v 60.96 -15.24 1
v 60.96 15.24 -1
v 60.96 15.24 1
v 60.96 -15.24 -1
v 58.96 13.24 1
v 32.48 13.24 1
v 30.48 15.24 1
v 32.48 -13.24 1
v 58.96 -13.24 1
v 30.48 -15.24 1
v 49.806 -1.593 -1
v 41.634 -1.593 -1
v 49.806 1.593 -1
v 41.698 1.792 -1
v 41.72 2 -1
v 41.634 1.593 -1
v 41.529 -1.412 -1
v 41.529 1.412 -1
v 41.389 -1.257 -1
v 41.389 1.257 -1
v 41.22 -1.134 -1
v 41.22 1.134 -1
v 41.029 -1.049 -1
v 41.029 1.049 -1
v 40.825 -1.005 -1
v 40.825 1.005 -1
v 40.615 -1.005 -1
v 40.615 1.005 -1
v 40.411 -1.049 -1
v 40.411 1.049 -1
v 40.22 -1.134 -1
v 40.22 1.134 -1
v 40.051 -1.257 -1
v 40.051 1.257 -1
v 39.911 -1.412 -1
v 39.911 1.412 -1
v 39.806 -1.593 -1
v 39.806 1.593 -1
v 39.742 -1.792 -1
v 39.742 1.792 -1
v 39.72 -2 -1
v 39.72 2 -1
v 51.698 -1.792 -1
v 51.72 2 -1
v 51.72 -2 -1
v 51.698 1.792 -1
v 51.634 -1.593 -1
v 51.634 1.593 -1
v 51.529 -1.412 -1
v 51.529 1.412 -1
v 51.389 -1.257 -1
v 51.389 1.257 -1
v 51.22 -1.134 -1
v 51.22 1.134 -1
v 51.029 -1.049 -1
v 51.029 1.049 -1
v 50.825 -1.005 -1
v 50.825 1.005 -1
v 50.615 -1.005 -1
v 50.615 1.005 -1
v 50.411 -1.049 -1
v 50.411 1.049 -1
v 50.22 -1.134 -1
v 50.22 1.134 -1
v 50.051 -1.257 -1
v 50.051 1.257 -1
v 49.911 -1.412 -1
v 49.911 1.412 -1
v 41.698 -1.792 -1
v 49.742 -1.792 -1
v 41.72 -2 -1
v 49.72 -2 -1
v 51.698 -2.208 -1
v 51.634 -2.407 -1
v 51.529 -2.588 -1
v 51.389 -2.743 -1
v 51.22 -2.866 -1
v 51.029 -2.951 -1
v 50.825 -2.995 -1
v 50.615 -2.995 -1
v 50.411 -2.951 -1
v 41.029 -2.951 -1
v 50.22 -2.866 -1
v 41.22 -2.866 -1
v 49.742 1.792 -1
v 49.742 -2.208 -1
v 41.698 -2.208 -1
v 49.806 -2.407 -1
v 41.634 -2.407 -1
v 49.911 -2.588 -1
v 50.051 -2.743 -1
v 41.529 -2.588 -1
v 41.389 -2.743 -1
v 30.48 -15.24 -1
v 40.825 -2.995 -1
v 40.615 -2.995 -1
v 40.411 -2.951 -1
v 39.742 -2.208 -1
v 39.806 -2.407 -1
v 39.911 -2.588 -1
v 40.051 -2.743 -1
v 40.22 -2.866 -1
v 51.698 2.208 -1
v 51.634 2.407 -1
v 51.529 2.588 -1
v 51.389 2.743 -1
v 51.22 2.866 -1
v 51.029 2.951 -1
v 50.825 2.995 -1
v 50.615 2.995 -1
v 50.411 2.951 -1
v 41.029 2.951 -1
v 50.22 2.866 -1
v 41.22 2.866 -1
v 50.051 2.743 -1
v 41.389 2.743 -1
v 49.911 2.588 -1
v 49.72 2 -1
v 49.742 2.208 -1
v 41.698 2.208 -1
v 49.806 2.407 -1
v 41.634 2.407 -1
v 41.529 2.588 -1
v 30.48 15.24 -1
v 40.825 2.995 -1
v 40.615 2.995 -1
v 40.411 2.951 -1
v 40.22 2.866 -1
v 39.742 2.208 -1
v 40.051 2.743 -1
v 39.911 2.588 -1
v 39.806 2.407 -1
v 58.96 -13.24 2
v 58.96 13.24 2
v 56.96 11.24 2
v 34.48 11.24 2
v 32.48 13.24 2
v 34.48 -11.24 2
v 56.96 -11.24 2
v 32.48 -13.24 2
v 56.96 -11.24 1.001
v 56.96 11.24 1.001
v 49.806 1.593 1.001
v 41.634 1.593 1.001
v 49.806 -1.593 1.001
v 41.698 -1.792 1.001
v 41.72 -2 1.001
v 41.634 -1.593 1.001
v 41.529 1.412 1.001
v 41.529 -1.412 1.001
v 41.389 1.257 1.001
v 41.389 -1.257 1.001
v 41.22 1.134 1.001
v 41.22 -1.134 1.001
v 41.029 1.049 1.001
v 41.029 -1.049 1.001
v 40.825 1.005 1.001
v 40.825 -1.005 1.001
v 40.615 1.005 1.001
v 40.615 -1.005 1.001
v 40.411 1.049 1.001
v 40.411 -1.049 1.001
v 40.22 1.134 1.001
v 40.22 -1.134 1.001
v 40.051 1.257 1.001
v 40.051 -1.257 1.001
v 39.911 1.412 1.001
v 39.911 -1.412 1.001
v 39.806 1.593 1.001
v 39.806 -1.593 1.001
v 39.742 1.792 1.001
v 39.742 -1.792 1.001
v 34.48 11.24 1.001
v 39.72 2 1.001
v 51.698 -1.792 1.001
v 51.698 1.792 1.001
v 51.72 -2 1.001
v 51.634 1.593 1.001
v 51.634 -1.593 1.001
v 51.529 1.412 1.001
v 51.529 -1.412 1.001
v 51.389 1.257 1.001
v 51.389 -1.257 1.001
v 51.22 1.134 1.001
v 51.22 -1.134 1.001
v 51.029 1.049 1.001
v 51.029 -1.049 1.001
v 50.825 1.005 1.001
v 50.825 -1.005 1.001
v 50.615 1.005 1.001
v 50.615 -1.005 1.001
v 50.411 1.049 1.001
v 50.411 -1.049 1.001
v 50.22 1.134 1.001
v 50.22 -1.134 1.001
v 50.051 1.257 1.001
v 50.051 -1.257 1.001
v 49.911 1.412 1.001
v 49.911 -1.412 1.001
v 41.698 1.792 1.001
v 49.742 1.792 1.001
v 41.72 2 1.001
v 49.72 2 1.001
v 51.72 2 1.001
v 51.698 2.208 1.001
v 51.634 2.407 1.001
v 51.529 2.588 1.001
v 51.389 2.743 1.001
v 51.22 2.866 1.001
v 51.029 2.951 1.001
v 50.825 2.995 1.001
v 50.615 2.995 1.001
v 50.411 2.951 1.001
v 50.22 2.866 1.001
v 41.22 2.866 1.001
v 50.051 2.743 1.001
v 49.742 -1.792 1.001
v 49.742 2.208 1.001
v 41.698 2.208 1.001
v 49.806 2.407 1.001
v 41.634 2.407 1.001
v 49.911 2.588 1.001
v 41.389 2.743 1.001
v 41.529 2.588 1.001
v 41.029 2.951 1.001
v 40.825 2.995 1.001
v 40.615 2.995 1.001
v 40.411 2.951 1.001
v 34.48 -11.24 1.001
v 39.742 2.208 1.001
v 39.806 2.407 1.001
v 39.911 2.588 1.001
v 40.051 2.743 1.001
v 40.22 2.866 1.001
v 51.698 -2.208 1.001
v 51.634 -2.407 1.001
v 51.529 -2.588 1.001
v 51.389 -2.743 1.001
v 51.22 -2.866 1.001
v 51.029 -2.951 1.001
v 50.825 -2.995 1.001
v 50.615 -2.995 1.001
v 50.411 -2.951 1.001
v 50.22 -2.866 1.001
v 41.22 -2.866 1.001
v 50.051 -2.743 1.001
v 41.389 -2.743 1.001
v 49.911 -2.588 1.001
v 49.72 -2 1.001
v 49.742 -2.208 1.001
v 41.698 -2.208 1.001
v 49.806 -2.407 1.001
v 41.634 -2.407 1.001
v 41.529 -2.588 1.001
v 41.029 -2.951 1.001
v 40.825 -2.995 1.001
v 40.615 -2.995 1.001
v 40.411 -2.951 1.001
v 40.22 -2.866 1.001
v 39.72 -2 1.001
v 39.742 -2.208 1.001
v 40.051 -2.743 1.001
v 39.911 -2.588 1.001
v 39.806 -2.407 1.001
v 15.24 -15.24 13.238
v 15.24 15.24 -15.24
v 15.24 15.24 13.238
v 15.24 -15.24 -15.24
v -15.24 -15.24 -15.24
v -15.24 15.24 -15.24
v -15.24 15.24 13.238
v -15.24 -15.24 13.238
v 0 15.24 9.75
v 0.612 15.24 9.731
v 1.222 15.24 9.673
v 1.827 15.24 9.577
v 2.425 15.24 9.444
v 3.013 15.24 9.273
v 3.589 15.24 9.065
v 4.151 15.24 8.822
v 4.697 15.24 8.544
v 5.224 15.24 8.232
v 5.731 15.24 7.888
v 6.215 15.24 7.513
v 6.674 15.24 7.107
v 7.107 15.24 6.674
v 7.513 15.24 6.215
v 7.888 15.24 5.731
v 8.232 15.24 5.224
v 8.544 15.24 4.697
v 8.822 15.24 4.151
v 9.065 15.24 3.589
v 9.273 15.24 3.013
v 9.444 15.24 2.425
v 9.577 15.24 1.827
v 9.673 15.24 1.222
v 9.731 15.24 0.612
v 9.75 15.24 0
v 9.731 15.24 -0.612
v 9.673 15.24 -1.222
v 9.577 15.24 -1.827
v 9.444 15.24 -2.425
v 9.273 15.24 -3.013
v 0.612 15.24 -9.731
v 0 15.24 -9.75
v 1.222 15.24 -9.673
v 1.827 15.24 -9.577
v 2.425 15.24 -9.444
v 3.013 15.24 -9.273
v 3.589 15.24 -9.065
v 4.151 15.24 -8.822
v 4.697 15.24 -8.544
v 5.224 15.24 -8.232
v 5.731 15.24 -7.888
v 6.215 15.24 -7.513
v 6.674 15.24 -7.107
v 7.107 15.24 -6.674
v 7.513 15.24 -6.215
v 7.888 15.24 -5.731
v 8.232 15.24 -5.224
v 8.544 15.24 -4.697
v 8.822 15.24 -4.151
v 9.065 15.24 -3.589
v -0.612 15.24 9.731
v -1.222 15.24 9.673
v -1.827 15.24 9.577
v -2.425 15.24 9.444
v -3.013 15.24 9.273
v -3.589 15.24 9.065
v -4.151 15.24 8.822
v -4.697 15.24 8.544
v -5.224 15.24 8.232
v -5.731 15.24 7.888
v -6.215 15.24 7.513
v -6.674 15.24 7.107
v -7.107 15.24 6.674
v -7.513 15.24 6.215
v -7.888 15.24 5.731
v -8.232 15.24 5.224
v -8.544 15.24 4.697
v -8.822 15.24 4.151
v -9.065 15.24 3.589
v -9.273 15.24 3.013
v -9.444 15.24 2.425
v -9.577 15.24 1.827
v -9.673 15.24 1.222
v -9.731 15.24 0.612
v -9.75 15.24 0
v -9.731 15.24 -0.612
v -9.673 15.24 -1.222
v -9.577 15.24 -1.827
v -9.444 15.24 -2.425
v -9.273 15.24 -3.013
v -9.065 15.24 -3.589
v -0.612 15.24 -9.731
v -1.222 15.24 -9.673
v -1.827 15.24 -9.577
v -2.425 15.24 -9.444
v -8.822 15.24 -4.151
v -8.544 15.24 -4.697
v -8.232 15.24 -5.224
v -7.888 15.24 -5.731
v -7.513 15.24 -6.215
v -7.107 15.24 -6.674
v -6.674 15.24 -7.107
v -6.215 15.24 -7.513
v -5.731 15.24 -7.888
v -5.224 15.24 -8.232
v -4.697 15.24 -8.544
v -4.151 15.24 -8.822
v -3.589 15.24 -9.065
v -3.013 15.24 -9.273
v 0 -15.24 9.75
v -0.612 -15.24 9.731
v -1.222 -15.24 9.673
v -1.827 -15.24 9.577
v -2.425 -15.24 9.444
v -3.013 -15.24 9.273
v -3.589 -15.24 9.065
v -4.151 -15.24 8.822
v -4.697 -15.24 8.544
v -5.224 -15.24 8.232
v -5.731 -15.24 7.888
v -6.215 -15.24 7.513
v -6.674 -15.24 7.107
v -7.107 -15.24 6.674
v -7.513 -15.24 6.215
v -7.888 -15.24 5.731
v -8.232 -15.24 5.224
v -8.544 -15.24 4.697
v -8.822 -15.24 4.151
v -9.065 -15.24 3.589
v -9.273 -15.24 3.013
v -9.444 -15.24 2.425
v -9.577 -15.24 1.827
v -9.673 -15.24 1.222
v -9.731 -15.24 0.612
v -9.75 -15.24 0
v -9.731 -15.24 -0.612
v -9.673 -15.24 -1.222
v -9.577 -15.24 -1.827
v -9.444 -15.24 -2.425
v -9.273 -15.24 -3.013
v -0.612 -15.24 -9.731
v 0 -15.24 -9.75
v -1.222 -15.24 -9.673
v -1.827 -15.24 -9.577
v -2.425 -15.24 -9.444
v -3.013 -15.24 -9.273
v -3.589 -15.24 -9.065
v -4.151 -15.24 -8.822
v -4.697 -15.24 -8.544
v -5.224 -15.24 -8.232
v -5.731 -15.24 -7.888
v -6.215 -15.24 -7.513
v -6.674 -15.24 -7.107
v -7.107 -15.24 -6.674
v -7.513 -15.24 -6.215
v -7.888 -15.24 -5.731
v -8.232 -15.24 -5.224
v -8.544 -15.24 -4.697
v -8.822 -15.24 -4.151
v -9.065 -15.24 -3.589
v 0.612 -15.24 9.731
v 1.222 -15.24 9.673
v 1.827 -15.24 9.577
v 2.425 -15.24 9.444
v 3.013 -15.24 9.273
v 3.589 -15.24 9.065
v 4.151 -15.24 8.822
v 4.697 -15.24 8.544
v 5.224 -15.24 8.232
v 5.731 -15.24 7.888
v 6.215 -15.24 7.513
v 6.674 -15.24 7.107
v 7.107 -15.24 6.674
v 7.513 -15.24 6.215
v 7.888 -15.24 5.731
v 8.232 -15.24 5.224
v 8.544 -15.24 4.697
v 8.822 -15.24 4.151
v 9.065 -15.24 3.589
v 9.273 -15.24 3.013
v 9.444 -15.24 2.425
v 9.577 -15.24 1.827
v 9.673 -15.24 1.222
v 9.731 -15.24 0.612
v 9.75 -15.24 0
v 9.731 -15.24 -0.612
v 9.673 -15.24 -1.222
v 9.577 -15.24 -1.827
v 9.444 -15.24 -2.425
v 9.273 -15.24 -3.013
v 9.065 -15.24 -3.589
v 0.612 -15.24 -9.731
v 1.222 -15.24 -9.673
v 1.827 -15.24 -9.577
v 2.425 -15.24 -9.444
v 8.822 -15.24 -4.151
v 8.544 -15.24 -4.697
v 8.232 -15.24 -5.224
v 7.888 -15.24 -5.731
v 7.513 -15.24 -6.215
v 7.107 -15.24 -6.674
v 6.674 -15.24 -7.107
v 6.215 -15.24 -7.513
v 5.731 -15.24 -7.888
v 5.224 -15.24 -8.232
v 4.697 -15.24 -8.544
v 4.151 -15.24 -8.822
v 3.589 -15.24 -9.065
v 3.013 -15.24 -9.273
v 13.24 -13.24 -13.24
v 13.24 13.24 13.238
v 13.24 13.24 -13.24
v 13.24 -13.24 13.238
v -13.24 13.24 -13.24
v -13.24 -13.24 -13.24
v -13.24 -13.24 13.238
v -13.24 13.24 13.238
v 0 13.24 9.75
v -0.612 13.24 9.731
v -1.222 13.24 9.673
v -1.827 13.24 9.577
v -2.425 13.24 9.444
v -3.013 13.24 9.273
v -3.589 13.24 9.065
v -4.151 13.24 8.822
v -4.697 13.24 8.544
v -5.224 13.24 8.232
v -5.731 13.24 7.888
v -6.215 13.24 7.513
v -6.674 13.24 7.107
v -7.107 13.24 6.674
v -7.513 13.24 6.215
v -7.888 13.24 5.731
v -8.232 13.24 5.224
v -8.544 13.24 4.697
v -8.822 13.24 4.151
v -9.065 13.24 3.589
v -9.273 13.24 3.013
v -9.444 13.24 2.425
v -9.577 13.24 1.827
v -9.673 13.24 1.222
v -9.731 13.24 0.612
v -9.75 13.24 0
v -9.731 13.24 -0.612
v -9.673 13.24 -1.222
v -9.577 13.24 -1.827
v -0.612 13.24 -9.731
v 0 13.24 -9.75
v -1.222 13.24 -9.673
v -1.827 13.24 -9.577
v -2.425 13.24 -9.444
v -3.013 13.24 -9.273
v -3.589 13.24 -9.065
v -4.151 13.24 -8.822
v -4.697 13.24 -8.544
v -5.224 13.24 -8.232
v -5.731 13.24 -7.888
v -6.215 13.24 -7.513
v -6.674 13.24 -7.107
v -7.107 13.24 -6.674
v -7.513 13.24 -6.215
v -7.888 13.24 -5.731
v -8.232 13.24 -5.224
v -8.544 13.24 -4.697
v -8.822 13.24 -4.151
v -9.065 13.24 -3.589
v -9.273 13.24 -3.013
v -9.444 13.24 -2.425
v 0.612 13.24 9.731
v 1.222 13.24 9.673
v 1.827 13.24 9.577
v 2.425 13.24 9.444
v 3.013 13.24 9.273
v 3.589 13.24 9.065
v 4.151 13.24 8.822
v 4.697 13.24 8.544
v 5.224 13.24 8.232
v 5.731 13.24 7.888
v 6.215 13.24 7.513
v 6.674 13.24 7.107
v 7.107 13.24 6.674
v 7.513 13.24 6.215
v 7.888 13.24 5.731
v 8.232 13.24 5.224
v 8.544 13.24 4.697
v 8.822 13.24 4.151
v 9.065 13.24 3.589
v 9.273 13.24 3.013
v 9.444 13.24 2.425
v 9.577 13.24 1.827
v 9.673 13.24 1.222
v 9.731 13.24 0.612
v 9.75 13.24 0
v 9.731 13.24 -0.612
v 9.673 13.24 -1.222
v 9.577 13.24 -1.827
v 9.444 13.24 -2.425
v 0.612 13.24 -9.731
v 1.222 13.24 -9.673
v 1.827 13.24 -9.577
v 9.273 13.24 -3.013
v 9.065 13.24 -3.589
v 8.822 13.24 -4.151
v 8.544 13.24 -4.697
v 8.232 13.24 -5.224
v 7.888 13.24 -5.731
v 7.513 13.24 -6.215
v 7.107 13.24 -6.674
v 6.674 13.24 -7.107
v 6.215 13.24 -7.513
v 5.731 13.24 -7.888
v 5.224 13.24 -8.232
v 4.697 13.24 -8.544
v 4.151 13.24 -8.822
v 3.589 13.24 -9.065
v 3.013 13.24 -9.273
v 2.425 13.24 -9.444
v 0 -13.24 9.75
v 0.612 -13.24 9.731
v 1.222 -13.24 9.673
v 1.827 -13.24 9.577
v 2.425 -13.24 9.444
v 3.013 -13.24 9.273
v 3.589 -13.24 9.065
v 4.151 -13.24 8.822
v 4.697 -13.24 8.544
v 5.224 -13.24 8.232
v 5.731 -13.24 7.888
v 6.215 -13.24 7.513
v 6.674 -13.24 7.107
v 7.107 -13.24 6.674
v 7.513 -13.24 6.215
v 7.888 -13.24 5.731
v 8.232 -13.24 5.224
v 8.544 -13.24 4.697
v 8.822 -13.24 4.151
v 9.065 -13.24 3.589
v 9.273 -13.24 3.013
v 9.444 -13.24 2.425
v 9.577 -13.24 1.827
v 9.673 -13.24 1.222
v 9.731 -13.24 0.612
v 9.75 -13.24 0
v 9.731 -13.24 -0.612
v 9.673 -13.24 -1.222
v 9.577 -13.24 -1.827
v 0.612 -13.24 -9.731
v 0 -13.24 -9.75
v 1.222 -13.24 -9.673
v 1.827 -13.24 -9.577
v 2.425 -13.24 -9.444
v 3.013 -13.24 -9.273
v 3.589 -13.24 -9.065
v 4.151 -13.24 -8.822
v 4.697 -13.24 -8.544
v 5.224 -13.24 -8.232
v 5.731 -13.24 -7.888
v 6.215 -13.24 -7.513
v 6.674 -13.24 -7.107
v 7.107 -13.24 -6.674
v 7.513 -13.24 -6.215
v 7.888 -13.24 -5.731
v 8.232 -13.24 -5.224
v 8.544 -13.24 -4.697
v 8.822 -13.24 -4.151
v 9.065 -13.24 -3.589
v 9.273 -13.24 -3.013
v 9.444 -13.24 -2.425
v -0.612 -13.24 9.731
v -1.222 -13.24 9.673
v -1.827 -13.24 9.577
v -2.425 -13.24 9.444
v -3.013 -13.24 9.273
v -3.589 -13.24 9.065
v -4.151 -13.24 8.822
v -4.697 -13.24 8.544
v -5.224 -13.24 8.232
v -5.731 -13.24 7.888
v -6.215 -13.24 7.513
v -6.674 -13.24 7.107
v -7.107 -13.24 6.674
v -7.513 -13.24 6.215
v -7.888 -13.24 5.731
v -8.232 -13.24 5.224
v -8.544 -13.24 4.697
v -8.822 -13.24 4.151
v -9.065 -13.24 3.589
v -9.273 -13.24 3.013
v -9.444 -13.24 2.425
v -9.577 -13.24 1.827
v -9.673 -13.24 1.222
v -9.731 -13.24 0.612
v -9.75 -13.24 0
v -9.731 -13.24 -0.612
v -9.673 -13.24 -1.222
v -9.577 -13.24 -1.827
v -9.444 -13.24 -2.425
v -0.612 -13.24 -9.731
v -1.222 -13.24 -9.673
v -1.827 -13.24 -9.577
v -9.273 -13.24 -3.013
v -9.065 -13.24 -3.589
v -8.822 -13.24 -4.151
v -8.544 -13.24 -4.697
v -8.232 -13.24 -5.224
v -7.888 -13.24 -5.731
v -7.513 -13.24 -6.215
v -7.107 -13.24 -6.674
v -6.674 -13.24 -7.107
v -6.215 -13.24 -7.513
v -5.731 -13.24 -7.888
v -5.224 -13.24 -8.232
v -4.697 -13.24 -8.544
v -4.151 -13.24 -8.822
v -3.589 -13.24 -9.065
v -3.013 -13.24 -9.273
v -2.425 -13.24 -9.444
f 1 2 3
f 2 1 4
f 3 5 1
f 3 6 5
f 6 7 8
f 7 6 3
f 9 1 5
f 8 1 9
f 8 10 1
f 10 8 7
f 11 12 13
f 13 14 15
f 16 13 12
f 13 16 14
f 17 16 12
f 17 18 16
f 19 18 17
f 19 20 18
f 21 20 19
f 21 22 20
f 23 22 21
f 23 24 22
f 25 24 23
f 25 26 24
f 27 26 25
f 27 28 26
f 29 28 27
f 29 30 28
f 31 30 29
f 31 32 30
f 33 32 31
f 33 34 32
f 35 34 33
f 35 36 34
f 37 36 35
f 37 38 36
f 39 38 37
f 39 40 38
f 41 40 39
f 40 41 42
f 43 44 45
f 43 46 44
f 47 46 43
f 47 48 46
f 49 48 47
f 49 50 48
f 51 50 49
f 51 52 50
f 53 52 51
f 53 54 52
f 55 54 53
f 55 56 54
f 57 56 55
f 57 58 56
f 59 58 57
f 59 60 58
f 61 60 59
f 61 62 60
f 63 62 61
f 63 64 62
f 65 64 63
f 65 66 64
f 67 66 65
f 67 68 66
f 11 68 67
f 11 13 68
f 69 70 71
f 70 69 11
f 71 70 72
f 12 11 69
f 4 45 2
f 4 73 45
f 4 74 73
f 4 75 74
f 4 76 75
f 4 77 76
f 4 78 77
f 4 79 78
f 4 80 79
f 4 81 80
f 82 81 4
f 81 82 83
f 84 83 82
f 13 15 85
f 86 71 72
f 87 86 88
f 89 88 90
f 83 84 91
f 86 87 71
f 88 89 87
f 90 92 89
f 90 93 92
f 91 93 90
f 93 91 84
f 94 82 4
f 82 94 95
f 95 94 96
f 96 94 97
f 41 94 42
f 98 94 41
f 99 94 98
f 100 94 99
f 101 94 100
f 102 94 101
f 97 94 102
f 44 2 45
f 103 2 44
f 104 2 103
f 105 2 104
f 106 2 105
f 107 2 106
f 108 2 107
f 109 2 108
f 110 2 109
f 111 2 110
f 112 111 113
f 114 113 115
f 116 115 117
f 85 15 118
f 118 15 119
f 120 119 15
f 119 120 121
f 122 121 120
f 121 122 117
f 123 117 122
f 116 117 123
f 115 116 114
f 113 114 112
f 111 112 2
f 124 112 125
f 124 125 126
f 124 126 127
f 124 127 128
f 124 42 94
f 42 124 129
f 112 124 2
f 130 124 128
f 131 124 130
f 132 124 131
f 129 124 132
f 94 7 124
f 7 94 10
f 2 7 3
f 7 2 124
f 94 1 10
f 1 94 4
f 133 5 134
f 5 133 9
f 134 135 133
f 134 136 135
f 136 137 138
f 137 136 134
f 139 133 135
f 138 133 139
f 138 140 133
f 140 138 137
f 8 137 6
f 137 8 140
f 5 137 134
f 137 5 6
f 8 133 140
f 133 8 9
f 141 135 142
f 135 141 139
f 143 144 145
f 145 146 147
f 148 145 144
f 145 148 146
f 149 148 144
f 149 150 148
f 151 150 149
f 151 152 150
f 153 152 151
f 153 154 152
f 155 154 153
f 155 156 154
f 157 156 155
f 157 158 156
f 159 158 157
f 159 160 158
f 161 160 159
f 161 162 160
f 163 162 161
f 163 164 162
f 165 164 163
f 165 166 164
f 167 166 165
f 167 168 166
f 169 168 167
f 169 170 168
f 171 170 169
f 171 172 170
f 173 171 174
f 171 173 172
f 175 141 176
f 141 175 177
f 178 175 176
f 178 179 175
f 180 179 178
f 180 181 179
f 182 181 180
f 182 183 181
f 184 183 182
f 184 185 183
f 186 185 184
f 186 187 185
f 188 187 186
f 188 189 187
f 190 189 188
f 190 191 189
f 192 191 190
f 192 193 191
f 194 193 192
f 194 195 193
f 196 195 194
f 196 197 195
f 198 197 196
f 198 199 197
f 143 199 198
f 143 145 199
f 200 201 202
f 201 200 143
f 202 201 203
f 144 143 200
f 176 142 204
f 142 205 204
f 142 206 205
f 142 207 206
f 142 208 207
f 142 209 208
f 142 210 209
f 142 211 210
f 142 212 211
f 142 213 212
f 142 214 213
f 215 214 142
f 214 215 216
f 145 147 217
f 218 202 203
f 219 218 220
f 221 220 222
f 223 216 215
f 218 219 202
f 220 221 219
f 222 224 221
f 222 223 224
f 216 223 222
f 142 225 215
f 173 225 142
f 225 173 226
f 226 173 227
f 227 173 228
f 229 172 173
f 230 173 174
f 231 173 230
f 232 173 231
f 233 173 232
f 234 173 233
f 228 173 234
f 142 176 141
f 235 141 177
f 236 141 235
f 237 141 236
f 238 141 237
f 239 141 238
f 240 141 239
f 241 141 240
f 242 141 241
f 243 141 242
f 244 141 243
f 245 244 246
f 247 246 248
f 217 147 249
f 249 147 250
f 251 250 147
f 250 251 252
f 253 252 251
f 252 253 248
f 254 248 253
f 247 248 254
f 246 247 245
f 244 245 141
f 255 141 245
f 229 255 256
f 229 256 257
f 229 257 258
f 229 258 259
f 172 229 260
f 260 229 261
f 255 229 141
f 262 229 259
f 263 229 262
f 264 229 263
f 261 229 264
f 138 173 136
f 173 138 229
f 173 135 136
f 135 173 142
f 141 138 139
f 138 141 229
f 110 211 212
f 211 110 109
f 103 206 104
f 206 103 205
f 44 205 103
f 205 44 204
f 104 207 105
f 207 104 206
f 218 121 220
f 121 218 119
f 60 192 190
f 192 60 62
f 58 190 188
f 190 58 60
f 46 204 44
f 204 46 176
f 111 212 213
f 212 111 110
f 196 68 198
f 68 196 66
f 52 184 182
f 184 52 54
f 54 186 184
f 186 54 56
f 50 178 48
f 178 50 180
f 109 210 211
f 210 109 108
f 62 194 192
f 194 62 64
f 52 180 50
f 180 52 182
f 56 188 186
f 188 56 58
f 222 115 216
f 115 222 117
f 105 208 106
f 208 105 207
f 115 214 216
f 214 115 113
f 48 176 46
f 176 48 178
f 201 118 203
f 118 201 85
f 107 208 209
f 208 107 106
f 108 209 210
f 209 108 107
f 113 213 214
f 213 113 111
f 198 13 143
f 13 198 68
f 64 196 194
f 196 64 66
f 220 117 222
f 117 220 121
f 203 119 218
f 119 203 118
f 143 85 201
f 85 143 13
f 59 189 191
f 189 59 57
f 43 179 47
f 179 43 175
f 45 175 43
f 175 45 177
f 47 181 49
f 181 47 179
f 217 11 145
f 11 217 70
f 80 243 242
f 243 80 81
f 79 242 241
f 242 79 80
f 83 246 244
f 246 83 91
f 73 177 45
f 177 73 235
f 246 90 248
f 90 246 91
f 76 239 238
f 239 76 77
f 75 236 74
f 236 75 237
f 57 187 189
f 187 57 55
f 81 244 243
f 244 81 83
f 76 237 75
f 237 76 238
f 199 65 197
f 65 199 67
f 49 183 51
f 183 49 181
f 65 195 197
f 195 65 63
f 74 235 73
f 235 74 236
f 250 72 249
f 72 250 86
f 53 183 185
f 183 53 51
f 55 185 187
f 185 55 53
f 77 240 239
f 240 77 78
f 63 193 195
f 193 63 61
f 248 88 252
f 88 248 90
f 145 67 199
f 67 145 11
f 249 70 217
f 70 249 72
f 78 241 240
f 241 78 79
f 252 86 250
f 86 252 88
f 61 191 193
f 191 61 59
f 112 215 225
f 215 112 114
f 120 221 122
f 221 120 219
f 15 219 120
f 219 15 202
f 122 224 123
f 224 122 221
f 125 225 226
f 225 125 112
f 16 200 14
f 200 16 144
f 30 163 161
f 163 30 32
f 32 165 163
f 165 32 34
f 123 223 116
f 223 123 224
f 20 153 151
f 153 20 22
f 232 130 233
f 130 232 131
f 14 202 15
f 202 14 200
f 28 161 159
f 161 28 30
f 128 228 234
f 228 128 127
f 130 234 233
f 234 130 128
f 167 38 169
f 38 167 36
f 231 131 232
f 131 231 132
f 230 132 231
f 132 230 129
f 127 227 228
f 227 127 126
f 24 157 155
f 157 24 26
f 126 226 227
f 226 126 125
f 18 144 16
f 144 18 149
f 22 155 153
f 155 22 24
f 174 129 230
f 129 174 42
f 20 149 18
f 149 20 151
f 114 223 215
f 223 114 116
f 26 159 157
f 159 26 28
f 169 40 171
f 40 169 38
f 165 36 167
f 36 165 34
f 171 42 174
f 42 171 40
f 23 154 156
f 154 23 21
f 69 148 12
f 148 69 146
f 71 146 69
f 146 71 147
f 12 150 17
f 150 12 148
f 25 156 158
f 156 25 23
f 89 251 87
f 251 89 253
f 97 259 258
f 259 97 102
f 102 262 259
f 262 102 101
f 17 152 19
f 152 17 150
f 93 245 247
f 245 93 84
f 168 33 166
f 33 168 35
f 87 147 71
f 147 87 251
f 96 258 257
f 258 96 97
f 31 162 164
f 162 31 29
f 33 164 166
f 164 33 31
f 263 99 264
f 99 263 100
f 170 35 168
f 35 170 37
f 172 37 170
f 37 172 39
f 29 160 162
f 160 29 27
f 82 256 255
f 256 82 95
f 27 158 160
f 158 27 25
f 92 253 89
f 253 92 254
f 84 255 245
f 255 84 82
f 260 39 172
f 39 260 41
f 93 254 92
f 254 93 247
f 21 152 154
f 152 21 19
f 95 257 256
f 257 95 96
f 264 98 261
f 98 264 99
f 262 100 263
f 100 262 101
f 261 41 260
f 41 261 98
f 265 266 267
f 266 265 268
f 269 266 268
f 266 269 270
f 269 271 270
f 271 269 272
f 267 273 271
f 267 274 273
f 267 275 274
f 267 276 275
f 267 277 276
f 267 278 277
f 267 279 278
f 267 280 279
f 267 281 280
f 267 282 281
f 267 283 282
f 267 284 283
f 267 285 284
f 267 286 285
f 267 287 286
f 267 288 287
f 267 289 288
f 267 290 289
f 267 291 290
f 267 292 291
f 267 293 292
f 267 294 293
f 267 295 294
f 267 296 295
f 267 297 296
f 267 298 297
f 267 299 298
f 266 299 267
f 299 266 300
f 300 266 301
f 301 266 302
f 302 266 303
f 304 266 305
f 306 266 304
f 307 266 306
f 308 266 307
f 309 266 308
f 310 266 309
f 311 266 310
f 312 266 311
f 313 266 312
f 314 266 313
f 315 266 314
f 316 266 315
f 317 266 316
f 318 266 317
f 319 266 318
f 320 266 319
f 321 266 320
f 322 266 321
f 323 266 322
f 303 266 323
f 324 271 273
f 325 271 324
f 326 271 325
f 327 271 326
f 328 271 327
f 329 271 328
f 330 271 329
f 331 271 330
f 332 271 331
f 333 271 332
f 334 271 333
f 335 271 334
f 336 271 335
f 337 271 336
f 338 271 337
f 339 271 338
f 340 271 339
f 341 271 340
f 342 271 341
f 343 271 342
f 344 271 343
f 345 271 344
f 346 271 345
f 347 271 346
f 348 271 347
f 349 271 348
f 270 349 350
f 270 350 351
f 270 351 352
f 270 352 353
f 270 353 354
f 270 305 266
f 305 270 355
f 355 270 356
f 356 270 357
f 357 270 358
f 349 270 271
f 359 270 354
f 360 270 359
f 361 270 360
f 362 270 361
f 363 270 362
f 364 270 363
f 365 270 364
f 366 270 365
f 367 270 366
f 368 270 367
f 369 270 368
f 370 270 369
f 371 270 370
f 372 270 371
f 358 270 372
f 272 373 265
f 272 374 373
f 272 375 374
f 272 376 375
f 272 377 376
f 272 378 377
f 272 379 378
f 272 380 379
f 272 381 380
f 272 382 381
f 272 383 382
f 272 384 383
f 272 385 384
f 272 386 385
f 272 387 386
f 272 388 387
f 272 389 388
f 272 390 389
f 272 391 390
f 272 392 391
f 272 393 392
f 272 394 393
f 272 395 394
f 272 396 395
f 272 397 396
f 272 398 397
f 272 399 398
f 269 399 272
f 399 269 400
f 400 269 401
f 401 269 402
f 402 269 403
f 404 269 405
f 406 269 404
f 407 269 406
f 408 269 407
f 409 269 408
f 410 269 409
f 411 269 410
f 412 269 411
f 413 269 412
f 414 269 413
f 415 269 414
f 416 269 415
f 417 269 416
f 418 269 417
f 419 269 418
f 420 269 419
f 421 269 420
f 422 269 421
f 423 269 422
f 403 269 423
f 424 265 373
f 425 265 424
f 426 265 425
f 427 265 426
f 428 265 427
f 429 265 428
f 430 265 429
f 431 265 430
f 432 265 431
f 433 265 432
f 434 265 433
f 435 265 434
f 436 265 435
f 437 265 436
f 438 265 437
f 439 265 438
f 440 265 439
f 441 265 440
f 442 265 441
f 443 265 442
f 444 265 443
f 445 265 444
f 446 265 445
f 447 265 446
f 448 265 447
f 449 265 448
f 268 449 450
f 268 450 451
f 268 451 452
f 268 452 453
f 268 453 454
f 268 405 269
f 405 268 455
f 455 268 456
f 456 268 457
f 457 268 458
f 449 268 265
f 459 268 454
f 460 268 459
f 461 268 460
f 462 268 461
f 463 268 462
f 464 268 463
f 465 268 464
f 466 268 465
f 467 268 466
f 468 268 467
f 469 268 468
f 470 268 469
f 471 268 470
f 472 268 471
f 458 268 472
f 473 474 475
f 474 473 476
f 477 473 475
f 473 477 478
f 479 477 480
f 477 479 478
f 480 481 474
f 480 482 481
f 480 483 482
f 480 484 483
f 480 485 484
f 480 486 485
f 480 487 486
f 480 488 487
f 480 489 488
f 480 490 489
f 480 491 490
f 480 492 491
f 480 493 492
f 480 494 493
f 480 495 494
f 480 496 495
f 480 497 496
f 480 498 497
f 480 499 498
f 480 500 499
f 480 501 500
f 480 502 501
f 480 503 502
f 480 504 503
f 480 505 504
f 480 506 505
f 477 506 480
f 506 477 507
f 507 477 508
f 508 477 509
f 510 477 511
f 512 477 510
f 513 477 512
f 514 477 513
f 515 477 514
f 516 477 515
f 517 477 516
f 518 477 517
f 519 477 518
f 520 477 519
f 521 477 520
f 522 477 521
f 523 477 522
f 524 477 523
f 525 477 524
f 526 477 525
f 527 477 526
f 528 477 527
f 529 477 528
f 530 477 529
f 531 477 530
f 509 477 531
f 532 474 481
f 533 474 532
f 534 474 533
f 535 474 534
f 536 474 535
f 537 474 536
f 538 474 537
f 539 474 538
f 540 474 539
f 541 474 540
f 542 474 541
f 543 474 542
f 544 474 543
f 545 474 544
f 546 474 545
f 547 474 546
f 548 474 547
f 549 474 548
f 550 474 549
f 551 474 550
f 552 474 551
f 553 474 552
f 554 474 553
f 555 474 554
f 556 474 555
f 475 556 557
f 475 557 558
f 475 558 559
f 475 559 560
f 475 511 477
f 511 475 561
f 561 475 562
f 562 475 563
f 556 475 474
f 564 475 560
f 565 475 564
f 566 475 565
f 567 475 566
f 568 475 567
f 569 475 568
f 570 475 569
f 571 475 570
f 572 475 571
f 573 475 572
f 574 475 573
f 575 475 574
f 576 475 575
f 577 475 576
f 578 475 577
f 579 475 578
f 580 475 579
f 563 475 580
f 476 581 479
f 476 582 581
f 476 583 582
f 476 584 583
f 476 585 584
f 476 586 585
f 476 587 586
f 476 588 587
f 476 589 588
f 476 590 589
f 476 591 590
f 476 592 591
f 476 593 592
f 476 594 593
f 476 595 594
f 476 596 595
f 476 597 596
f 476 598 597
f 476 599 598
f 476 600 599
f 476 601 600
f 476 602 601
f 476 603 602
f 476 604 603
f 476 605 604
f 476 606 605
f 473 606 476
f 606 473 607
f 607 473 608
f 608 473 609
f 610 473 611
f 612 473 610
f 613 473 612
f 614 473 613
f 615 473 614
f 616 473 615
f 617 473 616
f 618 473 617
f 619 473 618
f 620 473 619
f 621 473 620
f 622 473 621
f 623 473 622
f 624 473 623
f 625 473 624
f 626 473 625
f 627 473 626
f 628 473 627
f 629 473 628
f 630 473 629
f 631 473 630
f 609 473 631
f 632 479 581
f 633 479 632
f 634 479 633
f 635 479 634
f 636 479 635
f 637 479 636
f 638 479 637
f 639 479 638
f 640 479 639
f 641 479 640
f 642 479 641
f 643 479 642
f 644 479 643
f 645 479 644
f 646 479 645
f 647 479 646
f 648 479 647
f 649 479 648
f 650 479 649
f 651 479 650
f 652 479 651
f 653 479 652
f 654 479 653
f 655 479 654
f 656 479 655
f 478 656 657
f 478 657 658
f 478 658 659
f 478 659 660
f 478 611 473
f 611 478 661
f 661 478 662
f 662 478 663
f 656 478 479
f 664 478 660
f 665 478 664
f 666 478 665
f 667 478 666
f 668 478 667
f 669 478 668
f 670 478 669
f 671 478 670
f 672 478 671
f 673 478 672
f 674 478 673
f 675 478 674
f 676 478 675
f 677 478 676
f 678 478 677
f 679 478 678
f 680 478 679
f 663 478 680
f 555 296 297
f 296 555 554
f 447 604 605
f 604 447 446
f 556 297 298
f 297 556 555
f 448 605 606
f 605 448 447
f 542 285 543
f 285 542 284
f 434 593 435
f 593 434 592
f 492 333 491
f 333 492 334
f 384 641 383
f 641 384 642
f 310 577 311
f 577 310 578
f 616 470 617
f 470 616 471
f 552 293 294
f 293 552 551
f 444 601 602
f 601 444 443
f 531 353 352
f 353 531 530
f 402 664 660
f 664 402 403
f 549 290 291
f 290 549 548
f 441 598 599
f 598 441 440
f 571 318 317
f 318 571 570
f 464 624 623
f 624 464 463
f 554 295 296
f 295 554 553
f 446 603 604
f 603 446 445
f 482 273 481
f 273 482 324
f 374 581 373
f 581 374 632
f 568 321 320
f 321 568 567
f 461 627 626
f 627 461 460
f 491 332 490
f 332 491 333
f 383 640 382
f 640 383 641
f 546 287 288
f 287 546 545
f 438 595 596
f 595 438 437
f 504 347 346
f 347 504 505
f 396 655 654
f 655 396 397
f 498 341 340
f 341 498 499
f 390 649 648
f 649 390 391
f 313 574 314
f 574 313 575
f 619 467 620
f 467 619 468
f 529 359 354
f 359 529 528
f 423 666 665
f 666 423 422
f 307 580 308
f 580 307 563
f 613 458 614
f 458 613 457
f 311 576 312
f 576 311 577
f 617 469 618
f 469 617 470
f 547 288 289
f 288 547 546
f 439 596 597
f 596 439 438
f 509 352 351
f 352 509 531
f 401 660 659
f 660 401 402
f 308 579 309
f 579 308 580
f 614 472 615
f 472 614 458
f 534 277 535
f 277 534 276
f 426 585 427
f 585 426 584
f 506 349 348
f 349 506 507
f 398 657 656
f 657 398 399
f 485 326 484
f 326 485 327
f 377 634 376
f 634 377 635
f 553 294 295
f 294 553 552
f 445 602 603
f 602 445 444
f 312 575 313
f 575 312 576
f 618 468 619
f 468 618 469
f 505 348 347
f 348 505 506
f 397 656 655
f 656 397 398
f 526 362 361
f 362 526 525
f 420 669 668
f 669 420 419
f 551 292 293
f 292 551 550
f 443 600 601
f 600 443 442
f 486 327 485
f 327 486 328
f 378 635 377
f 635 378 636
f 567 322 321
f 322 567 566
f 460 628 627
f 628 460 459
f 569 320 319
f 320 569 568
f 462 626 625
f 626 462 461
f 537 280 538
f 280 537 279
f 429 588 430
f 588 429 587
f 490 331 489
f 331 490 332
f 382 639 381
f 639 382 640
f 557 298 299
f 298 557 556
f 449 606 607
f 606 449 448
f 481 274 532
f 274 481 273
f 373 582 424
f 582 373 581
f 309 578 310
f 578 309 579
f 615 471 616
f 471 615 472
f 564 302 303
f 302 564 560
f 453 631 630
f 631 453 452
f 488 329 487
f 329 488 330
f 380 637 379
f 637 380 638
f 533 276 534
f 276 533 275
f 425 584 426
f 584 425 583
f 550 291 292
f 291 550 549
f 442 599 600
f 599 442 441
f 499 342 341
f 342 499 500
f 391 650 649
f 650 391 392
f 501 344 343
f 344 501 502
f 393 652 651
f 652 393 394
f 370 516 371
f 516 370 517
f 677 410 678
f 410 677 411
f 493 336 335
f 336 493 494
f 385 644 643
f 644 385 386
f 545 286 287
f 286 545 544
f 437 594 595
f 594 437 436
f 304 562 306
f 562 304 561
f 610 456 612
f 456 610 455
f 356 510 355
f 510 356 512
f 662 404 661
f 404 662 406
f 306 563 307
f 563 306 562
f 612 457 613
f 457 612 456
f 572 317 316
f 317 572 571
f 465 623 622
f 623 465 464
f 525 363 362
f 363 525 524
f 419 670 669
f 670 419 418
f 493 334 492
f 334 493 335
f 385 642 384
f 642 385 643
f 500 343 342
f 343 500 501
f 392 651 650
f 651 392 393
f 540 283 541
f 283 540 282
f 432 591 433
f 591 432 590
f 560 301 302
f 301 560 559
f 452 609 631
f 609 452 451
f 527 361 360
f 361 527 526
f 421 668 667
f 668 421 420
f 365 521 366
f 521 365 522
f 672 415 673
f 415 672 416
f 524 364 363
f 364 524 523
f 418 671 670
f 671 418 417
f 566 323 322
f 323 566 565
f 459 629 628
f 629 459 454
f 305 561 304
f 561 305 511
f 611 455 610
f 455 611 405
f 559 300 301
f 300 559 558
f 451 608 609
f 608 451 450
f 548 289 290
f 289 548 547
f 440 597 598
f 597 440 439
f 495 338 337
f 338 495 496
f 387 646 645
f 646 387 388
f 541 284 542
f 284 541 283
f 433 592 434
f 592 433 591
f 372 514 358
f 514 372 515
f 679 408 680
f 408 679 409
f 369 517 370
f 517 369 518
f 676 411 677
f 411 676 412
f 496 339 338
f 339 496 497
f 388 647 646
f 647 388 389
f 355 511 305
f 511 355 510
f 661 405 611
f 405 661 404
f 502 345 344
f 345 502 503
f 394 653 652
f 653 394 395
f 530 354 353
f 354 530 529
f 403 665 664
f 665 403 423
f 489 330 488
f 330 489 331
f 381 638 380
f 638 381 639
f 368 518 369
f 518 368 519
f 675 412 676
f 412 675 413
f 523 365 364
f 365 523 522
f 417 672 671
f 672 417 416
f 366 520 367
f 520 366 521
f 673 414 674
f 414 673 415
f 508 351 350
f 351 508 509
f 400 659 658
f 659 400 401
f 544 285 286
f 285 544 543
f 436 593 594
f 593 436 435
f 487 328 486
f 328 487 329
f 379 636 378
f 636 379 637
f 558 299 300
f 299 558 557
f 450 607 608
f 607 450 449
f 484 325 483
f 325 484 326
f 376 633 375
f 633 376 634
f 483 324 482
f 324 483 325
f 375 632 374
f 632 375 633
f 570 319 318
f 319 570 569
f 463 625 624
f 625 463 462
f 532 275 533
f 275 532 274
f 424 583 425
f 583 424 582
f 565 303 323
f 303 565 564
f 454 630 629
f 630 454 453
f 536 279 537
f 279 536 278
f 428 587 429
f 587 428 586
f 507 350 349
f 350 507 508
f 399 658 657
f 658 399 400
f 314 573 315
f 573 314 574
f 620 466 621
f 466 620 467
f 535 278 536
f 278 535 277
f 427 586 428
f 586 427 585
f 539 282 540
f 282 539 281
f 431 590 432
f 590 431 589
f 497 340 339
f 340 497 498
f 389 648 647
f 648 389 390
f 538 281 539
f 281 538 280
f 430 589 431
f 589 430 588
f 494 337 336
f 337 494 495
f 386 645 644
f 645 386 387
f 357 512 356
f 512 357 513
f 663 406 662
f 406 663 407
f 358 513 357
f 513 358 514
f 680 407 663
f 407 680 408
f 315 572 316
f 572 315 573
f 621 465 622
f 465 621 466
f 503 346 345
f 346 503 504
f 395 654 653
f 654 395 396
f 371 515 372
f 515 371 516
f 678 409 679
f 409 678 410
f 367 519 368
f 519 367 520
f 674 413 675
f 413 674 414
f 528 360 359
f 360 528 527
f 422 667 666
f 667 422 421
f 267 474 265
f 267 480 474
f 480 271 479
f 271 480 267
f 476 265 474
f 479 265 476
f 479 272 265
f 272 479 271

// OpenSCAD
include <MCAD/units.scad>

side_len = 1.2*inch;
wall_thickness = 2*mm;
hole_d = 1.95*cm;

module lowerPrint() {
        difference(){
            cube(side_len, center=true);
            cube(side_len - 2*wall_thickness, center=true);
            rotate([90,0,0])
            cylinder(h = 2*side_len, d = hole_d, center= true, $fn = 100);
            translate([0,0,side_len - wall_thickness - 0.001]) 
                cube(side_len+0.001, center=true);
        }
}

module wireHole() {
    cylinder(d=2*mm, h =9999, center=true, $fn = 30);
}

module upperPrint() {
    difference(){
        union(){
            cube([side_len, side_len, wall_thickness], center=true);
            translate([0,0,wall_thickness * 0.25])  cube([side_len - 2*wall_thickness, side_len - 2*wall_thickness, 1.5*wall_thickness], center=true);
        }
        
        translate([0,0,wall_thickness]) cube([side_len - 4*wall_thickness, side_len - 4*wall_thickness, .999*wall_thickness], center=true);
        
        translate([5*mm,2*mm,0]) wireHole();
        translate([5*mm,-2*mm,0]) wireHole();
        translate([-5*mm,2*mm,0]) wireHole();
        translate([-5*mm,-2*mm,0]) wireHole();
        
    }
}

translate([side_len*1.5, 0]) upperPrint();
lowerPrint();
